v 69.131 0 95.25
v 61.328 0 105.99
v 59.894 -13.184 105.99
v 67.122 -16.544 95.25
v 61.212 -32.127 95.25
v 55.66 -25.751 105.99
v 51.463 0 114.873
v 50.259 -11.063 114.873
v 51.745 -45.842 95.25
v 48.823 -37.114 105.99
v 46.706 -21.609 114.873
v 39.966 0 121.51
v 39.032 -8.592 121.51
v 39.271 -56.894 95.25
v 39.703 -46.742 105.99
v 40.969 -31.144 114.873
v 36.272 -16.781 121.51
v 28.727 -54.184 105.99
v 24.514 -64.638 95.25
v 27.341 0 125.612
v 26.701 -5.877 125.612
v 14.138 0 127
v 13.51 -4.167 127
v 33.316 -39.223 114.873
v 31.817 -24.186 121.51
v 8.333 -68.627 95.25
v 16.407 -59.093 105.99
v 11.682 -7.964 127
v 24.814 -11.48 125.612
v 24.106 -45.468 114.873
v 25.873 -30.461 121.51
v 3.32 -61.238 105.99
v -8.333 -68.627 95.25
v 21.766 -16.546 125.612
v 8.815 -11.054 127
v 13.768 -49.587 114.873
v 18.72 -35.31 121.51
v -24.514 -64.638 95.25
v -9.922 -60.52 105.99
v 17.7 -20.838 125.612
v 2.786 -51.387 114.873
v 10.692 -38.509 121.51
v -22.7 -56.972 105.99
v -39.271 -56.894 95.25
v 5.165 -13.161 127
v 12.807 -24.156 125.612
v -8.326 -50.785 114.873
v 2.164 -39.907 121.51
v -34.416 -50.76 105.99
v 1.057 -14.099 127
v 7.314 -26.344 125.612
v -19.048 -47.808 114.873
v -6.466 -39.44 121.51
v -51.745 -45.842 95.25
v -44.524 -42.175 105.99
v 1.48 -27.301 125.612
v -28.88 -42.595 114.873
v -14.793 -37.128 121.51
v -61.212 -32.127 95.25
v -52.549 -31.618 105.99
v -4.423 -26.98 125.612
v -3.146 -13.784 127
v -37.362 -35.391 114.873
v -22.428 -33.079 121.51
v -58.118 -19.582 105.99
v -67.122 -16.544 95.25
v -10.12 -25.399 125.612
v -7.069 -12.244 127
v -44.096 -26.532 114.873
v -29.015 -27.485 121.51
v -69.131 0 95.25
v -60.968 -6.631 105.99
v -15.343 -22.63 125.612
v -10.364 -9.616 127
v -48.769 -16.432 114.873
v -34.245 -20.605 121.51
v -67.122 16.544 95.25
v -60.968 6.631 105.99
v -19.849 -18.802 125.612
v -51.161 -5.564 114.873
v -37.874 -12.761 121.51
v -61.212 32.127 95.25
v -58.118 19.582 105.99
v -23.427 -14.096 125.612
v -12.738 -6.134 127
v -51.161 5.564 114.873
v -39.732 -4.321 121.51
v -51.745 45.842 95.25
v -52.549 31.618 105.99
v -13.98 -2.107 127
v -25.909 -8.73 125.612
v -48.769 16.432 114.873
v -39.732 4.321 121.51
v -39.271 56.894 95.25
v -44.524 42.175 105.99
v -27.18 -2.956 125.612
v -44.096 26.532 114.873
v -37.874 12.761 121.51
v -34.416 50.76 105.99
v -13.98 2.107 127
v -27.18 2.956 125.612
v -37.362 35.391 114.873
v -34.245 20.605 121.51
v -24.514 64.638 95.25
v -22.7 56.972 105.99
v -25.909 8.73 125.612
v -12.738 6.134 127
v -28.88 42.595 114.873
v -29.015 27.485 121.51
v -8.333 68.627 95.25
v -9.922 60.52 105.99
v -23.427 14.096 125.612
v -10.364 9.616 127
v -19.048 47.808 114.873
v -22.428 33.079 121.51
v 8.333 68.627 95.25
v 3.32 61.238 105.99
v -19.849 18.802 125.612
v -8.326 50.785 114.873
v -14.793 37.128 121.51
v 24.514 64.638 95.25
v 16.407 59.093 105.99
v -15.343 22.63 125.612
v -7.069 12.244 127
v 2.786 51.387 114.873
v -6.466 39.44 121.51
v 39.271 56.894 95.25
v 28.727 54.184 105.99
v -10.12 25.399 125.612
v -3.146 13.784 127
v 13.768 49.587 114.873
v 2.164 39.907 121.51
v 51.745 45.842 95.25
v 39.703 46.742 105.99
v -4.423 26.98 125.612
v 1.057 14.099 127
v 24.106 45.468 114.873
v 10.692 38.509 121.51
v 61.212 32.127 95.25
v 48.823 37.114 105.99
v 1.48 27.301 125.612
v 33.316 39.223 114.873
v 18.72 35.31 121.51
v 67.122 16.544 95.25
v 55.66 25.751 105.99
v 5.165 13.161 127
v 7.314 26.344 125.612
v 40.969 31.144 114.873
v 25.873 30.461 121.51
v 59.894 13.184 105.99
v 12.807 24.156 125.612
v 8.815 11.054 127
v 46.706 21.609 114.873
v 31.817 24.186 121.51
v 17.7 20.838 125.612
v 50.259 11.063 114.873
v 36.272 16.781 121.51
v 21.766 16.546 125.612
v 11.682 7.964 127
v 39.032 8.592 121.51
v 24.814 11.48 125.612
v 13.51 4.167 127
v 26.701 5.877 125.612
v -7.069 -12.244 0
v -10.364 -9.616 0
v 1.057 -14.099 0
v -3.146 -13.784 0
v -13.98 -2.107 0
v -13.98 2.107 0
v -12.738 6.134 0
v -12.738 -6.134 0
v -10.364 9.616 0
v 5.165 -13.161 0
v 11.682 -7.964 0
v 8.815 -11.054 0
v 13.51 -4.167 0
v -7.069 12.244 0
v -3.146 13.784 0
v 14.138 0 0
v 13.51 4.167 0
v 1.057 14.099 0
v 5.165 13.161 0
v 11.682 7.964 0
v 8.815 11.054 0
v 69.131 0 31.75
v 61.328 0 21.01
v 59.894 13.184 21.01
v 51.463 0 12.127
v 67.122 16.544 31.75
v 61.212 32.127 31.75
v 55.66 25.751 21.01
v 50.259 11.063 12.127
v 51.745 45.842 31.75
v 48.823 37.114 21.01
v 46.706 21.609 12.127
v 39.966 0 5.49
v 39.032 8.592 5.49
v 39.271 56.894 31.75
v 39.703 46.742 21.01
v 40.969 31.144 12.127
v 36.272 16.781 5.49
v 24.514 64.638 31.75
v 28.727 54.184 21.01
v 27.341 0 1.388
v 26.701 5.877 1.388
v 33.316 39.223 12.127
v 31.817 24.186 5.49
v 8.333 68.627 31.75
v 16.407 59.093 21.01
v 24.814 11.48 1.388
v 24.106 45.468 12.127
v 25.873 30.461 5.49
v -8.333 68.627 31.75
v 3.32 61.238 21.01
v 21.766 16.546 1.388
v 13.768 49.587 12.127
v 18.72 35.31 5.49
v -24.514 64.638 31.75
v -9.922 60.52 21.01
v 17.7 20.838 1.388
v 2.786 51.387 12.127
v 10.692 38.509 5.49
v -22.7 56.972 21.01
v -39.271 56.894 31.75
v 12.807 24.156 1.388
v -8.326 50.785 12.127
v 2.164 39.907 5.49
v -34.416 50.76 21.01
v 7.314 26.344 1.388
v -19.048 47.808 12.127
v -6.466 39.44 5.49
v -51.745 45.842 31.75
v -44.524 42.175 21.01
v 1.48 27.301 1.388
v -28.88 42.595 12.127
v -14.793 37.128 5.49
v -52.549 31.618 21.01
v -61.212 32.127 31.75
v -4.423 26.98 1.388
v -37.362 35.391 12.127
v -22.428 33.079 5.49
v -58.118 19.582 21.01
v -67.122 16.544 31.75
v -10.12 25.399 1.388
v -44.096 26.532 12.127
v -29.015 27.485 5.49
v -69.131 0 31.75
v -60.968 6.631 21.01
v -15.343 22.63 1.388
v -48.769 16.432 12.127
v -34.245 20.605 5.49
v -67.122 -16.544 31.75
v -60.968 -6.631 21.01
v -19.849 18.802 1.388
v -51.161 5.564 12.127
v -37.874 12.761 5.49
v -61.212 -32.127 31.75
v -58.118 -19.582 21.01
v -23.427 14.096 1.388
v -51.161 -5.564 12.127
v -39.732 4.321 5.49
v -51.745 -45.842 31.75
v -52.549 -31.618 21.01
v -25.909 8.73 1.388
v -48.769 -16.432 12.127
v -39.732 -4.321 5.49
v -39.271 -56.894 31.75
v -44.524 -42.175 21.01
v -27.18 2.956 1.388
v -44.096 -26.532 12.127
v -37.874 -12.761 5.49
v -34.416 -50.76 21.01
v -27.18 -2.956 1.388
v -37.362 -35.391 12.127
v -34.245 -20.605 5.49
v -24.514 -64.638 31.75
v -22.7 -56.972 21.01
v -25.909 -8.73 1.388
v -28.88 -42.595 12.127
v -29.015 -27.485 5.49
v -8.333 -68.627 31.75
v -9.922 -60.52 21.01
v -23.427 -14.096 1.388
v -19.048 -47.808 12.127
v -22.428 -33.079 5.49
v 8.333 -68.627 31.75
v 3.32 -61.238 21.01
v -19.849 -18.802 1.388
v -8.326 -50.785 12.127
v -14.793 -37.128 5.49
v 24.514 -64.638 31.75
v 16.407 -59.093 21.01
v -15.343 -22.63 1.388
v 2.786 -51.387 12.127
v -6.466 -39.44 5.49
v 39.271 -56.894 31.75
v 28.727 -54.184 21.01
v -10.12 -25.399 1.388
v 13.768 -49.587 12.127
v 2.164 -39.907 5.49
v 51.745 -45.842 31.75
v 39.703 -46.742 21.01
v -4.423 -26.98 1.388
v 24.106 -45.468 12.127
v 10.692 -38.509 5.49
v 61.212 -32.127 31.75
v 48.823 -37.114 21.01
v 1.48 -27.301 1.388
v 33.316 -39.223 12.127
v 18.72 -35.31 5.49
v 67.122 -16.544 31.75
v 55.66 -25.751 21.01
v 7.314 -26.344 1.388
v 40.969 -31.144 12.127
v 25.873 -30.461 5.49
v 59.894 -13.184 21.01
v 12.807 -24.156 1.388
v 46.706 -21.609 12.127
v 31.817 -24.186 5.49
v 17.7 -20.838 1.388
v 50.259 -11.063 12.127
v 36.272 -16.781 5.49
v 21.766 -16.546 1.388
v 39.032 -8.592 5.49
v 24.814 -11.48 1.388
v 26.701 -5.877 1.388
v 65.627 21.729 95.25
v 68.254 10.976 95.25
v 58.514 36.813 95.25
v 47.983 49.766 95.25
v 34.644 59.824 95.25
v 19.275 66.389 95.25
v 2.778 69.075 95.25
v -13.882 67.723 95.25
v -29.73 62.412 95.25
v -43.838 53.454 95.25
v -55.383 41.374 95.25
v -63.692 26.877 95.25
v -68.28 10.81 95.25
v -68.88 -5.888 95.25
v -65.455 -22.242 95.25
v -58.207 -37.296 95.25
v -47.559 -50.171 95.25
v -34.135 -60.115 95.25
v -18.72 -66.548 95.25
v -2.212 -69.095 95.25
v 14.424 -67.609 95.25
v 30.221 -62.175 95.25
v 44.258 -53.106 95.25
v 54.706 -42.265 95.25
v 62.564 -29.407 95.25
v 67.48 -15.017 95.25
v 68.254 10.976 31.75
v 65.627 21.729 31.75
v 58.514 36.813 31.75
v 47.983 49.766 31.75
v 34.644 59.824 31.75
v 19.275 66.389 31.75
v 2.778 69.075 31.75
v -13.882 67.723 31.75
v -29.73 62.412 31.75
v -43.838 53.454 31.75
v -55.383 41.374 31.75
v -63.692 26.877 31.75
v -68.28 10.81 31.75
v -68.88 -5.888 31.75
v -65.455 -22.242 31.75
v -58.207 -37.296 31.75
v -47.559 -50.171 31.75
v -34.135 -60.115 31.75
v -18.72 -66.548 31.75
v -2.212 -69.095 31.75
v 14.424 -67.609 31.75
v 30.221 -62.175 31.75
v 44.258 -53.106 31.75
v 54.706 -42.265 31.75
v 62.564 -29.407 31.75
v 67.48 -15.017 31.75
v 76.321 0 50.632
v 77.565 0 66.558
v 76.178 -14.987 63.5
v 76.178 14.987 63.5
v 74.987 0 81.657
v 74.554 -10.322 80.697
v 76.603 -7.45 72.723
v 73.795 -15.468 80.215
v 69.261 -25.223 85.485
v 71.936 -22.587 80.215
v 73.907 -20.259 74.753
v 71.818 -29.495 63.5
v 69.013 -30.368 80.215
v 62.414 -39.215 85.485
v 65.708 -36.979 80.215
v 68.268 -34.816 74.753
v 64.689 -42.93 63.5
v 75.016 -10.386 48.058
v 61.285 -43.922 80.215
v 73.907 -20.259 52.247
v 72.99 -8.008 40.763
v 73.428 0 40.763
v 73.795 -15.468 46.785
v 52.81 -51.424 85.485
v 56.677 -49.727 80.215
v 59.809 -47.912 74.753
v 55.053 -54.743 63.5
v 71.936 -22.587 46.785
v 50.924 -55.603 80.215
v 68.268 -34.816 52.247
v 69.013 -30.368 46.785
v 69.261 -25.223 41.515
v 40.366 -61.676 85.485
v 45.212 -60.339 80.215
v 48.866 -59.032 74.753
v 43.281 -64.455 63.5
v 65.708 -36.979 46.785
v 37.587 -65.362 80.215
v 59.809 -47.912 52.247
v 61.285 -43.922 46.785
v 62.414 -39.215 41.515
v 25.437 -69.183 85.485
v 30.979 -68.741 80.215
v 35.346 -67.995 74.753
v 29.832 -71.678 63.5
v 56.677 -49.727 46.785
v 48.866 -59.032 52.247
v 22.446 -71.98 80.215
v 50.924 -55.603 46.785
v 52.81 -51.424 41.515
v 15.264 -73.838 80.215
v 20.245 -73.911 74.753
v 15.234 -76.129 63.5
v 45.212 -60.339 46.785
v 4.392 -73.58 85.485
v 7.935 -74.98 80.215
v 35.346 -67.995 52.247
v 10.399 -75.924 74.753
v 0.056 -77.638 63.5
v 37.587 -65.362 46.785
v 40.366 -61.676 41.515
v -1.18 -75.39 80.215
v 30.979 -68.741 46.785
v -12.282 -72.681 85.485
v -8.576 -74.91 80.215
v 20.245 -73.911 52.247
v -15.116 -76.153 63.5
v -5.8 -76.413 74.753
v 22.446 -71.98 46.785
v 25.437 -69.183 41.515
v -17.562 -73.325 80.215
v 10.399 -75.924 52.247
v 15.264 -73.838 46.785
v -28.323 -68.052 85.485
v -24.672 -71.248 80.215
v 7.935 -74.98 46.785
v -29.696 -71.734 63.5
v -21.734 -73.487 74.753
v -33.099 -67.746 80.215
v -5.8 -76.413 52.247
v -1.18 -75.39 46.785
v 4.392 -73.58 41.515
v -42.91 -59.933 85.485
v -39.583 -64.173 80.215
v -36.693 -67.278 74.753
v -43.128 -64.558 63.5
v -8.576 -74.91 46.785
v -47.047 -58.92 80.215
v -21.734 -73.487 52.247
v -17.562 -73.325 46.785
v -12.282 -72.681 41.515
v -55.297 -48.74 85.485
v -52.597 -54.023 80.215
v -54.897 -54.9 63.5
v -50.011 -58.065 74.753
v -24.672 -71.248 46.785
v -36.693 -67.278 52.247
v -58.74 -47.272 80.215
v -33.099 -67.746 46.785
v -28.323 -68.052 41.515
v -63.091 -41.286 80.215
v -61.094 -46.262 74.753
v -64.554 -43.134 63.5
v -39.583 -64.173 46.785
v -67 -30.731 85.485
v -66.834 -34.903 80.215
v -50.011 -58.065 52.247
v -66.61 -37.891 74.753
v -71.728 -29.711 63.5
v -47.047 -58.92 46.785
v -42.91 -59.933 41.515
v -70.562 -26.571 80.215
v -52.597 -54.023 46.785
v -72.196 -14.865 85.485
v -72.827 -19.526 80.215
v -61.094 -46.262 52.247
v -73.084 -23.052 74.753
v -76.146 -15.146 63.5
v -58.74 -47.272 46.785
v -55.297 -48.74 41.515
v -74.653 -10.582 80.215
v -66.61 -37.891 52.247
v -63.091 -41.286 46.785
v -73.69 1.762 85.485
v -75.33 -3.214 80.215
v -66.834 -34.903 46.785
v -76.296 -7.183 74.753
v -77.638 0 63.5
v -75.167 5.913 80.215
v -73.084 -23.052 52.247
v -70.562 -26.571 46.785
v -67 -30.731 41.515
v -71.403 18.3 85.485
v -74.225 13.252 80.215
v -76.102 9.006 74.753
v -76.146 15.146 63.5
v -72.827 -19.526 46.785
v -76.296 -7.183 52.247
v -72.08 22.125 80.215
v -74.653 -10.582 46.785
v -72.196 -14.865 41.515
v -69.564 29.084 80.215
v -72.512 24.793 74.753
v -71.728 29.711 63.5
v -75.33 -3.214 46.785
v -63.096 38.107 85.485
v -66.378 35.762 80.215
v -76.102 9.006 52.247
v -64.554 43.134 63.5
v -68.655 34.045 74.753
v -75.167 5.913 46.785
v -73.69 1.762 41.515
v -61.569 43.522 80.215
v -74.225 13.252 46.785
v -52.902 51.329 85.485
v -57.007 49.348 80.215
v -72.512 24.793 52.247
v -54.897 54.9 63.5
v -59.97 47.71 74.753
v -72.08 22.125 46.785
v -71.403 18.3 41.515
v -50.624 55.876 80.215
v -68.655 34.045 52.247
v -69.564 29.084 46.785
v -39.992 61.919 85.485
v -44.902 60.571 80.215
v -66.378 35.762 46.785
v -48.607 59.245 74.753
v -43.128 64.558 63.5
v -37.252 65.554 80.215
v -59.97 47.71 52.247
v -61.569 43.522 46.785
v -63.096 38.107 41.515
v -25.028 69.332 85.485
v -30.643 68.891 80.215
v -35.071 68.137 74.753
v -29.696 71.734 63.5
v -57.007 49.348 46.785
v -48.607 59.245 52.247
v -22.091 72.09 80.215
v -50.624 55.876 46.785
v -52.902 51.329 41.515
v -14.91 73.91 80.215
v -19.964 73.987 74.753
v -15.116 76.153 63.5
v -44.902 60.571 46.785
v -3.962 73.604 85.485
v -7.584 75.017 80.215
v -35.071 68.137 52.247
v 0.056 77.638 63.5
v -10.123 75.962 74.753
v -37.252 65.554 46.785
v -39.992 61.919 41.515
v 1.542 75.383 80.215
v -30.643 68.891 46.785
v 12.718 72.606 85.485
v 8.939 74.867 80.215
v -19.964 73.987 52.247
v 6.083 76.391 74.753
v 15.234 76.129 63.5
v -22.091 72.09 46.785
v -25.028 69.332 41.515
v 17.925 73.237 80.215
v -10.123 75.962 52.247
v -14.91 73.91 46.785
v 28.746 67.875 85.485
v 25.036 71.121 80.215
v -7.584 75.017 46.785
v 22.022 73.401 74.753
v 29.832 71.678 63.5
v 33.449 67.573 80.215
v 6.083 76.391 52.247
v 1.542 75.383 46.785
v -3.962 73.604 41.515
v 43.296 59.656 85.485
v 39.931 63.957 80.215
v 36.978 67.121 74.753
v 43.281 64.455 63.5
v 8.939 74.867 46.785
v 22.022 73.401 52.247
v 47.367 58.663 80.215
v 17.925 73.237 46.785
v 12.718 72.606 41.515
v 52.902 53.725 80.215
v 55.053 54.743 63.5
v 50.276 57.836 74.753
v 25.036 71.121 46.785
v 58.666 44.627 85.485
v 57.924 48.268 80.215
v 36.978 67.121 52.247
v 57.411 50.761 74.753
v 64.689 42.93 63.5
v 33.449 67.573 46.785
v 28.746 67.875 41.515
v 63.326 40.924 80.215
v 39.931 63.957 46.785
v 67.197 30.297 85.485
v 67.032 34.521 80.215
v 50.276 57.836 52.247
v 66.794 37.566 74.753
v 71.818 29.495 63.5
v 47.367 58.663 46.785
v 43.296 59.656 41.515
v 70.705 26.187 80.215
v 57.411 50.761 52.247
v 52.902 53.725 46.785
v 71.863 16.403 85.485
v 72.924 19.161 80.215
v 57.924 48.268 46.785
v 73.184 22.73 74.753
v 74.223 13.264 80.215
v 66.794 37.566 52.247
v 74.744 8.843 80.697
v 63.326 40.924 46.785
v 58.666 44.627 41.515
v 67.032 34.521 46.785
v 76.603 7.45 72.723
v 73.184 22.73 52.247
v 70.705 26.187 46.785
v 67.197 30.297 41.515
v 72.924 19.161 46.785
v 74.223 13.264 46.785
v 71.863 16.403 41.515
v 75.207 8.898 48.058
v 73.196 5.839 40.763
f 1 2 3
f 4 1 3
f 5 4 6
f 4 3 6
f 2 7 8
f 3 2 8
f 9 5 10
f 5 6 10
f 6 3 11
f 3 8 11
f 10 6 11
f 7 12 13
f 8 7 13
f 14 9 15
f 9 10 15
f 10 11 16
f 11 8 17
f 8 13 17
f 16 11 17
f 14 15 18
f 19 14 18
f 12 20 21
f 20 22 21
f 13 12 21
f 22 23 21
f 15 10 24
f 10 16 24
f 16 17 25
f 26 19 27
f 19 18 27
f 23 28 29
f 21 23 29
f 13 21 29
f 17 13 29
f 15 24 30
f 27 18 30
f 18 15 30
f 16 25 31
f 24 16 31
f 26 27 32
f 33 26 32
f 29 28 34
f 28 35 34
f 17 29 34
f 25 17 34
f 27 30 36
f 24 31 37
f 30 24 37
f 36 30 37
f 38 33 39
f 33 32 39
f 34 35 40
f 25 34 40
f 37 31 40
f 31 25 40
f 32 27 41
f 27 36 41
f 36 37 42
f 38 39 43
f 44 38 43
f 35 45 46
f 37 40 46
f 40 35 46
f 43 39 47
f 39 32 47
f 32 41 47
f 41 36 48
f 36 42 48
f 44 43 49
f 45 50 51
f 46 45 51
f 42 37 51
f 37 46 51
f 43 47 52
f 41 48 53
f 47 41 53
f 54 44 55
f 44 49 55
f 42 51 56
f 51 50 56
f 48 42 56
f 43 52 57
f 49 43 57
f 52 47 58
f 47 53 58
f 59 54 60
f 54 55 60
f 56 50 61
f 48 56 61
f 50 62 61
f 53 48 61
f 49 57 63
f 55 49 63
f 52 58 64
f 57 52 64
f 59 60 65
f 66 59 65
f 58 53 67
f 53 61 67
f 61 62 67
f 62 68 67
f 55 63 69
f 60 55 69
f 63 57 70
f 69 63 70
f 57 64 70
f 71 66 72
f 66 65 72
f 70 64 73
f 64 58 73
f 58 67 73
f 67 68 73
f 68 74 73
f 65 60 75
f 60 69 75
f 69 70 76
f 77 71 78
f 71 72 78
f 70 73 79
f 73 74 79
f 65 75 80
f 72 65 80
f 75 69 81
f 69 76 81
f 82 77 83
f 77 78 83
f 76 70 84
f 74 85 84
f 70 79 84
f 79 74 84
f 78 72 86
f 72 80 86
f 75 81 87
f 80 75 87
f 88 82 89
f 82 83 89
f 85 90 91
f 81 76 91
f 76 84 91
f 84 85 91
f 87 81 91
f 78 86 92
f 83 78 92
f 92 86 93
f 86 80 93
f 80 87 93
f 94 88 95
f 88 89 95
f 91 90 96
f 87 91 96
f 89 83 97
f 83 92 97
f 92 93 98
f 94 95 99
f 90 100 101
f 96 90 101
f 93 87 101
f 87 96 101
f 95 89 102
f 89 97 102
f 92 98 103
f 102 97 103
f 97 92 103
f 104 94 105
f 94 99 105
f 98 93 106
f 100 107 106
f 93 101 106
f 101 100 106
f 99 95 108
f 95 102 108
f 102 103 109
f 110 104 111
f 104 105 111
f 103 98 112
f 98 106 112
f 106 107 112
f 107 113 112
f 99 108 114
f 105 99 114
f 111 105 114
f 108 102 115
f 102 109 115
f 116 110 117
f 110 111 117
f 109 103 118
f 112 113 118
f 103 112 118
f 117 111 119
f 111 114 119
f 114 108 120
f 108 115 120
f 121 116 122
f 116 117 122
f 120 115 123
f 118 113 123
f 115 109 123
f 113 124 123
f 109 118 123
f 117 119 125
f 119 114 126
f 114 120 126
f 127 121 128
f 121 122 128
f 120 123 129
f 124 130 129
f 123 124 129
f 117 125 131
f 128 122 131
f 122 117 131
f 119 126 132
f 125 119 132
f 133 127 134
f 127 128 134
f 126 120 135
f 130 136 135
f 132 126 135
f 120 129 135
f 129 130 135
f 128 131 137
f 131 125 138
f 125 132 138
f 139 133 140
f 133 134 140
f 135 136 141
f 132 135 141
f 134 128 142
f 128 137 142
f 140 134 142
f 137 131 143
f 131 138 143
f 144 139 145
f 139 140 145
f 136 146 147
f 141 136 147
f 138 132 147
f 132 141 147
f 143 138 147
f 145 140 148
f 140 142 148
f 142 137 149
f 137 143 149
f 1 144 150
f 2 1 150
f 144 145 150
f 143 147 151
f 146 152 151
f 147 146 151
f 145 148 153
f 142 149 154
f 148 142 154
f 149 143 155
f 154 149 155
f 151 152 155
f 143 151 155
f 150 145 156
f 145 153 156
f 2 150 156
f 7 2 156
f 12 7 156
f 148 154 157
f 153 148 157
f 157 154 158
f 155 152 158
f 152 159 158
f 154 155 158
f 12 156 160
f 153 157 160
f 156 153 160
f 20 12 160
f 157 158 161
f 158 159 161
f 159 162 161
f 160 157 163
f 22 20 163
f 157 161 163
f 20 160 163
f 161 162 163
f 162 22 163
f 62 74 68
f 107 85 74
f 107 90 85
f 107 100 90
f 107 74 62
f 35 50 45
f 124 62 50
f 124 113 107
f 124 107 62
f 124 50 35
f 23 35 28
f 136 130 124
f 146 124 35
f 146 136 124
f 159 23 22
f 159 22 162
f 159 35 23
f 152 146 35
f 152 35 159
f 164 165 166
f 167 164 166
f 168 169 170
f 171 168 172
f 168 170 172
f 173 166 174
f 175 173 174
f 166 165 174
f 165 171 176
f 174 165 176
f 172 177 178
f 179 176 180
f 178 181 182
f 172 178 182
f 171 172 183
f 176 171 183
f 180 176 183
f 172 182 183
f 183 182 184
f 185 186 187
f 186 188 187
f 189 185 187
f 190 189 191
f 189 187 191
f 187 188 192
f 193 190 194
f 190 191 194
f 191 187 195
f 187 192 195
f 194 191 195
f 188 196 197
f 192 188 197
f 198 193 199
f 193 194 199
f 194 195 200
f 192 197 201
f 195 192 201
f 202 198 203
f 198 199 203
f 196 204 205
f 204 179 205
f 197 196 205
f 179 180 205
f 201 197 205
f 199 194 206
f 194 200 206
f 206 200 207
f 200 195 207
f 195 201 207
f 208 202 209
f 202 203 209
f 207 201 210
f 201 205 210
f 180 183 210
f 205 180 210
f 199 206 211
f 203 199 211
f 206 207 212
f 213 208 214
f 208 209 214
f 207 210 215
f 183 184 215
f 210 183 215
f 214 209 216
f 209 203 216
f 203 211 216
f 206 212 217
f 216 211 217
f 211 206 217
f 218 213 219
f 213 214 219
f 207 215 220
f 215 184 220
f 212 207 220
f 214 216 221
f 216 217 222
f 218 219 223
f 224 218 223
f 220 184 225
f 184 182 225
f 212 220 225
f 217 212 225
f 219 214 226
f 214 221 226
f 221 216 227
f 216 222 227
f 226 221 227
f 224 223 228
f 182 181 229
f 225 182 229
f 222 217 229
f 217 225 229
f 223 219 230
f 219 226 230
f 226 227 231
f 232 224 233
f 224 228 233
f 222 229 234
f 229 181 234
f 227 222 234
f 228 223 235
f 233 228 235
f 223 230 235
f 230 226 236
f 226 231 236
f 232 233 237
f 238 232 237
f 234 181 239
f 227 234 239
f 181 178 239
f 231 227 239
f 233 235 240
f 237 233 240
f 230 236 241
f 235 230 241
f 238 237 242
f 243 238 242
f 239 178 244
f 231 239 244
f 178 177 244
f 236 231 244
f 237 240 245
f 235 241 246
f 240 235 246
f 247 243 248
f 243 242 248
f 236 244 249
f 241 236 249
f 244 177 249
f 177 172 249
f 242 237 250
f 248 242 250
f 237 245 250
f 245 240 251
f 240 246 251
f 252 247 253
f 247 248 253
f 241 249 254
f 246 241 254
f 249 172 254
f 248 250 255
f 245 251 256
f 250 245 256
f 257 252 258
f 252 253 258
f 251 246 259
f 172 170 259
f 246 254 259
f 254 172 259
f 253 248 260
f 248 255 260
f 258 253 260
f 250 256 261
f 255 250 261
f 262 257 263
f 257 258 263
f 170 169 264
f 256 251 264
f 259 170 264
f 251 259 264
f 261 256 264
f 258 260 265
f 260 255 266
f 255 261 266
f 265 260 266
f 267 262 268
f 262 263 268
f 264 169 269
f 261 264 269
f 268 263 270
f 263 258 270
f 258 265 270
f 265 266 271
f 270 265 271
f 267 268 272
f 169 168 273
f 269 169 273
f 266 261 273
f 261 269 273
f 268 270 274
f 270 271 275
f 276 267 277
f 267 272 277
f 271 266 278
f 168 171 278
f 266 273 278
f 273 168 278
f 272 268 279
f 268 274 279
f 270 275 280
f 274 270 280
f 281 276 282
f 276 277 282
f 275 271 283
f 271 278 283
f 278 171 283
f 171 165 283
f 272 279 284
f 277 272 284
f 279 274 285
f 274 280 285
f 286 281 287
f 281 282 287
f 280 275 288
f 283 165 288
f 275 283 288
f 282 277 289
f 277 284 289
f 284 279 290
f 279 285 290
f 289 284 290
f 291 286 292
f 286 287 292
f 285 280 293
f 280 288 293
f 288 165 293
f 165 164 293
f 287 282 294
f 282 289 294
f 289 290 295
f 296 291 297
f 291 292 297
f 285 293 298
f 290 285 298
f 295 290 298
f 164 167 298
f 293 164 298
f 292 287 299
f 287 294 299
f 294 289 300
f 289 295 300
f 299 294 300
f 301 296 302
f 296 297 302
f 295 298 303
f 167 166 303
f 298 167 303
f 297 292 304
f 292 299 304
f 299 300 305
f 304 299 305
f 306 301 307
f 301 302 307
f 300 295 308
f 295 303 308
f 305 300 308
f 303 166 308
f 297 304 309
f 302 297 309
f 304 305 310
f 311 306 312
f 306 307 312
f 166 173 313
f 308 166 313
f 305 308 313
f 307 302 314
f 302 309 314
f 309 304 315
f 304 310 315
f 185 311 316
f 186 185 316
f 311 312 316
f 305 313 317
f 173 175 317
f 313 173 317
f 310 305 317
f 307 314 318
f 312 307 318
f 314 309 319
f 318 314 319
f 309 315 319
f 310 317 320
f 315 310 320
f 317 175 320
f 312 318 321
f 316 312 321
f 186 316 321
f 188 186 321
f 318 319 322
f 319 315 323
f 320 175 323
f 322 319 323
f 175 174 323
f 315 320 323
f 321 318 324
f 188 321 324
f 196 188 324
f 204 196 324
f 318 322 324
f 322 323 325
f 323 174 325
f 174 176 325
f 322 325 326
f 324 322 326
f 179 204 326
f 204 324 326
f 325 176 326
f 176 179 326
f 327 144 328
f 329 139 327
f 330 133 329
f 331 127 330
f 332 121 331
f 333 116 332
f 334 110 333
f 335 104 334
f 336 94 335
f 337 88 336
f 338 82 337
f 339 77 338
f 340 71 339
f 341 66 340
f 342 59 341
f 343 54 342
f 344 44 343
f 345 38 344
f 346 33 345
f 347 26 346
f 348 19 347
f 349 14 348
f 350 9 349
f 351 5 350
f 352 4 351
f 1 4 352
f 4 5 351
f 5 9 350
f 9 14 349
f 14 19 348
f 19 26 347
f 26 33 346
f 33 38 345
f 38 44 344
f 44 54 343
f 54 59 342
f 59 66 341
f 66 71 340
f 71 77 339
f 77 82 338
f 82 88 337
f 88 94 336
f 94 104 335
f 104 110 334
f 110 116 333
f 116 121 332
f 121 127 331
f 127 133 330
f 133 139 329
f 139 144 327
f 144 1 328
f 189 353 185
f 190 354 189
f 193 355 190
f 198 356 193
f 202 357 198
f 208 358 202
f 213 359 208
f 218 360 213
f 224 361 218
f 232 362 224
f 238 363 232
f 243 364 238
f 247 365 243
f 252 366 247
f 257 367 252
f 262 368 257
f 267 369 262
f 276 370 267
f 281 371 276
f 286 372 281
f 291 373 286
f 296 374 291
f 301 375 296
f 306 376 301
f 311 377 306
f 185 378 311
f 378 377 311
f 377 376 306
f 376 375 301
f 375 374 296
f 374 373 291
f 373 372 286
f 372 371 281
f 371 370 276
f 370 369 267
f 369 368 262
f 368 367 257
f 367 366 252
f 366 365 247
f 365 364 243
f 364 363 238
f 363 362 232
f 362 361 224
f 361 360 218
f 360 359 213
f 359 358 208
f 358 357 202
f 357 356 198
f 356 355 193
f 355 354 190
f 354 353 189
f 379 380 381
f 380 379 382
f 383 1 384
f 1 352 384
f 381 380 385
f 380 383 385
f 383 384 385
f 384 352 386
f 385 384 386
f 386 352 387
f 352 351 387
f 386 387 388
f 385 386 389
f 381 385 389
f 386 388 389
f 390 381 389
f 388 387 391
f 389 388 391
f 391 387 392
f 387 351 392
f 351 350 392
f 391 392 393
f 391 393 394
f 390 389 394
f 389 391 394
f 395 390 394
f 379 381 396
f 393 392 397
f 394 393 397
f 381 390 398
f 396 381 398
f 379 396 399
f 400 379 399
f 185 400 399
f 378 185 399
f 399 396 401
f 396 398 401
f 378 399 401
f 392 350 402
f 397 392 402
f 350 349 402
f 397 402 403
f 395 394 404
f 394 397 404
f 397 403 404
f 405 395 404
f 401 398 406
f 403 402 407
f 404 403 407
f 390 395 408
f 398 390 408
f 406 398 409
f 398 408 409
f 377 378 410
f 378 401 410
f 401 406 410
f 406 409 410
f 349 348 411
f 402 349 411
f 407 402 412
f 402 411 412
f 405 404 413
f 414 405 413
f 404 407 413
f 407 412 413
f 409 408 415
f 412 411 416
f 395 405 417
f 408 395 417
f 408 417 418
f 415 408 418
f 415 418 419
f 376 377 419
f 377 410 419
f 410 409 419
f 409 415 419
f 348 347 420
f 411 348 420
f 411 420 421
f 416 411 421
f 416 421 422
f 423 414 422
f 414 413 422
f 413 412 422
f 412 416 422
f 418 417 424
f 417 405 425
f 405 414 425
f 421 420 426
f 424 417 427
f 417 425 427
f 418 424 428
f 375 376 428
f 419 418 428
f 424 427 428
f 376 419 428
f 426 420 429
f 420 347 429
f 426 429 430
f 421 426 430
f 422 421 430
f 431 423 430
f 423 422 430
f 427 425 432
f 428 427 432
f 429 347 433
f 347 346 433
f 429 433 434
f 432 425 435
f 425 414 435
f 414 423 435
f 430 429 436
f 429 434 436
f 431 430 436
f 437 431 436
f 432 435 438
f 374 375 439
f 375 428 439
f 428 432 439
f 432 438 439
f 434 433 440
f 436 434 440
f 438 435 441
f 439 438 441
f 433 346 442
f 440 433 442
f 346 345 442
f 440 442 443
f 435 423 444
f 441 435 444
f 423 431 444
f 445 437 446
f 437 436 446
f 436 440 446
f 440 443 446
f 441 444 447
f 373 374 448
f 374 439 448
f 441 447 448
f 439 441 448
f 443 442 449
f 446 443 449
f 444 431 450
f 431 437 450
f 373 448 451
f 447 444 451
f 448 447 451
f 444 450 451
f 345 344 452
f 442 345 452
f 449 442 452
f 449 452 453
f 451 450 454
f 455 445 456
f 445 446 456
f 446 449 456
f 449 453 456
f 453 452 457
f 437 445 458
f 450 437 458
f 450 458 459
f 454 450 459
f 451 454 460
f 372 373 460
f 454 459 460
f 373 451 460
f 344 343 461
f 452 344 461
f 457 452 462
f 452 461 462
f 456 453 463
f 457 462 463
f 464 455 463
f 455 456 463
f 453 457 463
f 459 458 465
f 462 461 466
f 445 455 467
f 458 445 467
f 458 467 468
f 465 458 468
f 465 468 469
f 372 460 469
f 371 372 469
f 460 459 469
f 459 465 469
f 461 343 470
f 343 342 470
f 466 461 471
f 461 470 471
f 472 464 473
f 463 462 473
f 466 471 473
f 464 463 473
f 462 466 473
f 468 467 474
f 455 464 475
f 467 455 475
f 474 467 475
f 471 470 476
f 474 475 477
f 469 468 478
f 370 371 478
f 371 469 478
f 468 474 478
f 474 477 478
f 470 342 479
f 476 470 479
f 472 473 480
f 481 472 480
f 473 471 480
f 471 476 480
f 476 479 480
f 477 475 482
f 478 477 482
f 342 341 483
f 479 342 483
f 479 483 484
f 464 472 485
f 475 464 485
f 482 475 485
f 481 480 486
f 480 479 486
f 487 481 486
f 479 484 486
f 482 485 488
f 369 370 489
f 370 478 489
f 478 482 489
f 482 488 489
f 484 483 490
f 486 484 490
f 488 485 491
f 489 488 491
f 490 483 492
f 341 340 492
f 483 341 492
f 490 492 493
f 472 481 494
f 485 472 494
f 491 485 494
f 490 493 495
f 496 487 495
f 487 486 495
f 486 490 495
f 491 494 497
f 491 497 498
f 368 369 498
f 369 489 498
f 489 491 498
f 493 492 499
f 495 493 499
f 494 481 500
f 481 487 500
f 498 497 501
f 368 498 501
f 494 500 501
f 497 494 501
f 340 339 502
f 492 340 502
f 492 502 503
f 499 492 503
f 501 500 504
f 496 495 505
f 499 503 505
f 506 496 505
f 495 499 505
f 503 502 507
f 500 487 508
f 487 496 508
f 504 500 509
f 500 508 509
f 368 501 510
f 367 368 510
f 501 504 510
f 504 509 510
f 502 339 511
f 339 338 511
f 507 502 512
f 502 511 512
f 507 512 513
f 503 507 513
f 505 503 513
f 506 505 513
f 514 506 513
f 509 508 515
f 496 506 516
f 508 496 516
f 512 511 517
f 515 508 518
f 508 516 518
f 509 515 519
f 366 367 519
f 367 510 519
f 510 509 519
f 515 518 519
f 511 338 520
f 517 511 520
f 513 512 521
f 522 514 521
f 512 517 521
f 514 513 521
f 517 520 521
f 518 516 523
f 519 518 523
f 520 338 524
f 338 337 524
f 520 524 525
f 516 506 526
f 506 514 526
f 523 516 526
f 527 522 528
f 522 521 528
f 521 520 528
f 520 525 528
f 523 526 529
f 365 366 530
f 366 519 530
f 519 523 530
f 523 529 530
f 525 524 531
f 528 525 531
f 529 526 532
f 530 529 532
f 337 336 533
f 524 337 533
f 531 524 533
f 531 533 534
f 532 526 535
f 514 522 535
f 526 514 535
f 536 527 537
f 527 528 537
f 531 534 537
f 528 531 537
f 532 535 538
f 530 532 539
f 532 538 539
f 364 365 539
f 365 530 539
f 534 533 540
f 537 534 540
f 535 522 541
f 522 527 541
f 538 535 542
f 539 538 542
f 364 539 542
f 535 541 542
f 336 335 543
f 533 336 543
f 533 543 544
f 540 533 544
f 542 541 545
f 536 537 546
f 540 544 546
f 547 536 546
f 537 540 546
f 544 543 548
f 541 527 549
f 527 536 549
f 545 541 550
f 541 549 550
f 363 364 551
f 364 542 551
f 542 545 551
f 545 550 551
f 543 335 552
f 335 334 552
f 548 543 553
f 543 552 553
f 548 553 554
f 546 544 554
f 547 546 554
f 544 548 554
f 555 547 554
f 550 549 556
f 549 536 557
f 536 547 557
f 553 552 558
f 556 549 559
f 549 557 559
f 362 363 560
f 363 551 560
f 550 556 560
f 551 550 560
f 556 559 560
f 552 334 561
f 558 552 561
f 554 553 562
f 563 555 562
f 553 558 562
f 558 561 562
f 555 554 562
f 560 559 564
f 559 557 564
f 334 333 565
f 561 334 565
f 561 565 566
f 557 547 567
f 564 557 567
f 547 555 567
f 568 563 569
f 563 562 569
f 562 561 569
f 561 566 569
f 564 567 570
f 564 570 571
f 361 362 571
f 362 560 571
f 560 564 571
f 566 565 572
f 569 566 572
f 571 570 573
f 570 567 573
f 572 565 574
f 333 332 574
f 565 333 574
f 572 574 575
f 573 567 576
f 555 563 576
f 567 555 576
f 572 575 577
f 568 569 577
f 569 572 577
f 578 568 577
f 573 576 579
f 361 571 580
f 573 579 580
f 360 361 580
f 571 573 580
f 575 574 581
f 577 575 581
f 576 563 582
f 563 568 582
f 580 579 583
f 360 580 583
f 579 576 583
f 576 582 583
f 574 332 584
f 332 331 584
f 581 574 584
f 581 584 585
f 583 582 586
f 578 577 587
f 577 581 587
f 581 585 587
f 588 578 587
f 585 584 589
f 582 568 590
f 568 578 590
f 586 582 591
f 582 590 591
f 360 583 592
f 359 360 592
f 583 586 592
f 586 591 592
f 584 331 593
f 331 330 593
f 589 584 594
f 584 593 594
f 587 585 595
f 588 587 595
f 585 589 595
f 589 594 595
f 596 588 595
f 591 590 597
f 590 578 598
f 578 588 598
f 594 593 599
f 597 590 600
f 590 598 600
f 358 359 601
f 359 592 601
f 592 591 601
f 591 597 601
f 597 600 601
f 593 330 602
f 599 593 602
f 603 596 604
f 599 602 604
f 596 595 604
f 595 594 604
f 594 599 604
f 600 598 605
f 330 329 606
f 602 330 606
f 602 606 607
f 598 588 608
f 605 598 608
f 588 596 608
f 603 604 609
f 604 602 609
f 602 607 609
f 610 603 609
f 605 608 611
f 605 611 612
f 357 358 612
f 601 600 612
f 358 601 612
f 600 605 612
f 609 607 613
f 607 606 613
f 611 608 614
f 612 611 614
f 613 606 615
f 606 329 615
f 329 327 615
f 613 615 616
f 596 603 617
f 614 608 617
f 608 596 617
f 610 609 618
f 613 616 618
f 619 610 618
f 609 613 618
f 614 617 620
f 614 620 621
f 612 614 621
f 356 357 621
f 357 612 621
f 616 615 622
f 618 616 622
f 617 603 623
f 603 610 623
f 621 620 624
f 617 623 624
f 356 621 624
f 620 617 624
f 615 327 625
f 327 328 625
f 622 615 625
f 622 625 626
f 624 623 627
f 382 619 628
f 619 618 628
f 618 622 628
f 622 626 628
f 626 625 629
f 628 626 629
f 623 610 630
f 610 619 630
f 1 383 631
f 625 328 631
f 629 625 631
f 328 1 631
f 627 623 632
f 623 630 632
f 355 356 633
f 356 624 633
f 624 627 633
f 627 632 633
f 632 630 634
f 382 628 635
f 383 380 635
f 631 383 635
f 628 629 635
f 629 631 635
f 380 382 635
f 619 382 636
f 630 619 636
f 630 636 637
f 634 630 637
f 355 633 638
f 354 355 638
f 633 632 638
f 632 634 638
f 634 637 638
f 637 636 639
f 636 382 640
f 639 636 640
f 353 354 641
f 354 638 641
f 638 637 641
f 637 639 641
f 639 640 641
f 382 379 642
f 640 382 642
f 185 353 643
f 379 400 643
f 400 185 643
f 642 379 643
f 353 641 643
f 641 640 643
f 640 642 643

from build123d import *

# Parameters (mm, degrees)
F0_R      = 50.8
F1_DEPTH  = 63.5
F1_TAPER  = -30
F1_FACE_R = 87.4617420935
F2_DEPTH  = 63.5
F2_TAPER  = 30
F3_R      = 63.49999


# Not quite as in the source:
# - a fillet or chamfer is up to 0.001 mm smaller than in the source, because OpenCascade refuses the exact size


with BuildPart() as f1:
    # F0 (on Top) → F1 (new body)
    with BuildSketch(Plane.XY):
        Circle(F0_R)
    extrude(amount=F1_DEPTH, taper=F1_TAPER)

    # F1_face (on face) → F2 (join)
    with BuildSketch(Plane.XY.offset(63.5)):
        Circle(F1_FACE_R)
    extrude(amount=F2_DEPTH, taper=F2_TAPER)

    # F3 (radius 63.5 in the source; OpenCascade refuses exactly that, so slightly less here)
    f3_edges = [f1.edges().sort_by_distance(p)[0] for p in [
        (-87.461742, 0, 63.5),
        (-50.8, 0, 127),
        (-50.8, 0, 0),
    ]]
    fillet(f3_edges, radius=F3_R)


solid = f1.part
